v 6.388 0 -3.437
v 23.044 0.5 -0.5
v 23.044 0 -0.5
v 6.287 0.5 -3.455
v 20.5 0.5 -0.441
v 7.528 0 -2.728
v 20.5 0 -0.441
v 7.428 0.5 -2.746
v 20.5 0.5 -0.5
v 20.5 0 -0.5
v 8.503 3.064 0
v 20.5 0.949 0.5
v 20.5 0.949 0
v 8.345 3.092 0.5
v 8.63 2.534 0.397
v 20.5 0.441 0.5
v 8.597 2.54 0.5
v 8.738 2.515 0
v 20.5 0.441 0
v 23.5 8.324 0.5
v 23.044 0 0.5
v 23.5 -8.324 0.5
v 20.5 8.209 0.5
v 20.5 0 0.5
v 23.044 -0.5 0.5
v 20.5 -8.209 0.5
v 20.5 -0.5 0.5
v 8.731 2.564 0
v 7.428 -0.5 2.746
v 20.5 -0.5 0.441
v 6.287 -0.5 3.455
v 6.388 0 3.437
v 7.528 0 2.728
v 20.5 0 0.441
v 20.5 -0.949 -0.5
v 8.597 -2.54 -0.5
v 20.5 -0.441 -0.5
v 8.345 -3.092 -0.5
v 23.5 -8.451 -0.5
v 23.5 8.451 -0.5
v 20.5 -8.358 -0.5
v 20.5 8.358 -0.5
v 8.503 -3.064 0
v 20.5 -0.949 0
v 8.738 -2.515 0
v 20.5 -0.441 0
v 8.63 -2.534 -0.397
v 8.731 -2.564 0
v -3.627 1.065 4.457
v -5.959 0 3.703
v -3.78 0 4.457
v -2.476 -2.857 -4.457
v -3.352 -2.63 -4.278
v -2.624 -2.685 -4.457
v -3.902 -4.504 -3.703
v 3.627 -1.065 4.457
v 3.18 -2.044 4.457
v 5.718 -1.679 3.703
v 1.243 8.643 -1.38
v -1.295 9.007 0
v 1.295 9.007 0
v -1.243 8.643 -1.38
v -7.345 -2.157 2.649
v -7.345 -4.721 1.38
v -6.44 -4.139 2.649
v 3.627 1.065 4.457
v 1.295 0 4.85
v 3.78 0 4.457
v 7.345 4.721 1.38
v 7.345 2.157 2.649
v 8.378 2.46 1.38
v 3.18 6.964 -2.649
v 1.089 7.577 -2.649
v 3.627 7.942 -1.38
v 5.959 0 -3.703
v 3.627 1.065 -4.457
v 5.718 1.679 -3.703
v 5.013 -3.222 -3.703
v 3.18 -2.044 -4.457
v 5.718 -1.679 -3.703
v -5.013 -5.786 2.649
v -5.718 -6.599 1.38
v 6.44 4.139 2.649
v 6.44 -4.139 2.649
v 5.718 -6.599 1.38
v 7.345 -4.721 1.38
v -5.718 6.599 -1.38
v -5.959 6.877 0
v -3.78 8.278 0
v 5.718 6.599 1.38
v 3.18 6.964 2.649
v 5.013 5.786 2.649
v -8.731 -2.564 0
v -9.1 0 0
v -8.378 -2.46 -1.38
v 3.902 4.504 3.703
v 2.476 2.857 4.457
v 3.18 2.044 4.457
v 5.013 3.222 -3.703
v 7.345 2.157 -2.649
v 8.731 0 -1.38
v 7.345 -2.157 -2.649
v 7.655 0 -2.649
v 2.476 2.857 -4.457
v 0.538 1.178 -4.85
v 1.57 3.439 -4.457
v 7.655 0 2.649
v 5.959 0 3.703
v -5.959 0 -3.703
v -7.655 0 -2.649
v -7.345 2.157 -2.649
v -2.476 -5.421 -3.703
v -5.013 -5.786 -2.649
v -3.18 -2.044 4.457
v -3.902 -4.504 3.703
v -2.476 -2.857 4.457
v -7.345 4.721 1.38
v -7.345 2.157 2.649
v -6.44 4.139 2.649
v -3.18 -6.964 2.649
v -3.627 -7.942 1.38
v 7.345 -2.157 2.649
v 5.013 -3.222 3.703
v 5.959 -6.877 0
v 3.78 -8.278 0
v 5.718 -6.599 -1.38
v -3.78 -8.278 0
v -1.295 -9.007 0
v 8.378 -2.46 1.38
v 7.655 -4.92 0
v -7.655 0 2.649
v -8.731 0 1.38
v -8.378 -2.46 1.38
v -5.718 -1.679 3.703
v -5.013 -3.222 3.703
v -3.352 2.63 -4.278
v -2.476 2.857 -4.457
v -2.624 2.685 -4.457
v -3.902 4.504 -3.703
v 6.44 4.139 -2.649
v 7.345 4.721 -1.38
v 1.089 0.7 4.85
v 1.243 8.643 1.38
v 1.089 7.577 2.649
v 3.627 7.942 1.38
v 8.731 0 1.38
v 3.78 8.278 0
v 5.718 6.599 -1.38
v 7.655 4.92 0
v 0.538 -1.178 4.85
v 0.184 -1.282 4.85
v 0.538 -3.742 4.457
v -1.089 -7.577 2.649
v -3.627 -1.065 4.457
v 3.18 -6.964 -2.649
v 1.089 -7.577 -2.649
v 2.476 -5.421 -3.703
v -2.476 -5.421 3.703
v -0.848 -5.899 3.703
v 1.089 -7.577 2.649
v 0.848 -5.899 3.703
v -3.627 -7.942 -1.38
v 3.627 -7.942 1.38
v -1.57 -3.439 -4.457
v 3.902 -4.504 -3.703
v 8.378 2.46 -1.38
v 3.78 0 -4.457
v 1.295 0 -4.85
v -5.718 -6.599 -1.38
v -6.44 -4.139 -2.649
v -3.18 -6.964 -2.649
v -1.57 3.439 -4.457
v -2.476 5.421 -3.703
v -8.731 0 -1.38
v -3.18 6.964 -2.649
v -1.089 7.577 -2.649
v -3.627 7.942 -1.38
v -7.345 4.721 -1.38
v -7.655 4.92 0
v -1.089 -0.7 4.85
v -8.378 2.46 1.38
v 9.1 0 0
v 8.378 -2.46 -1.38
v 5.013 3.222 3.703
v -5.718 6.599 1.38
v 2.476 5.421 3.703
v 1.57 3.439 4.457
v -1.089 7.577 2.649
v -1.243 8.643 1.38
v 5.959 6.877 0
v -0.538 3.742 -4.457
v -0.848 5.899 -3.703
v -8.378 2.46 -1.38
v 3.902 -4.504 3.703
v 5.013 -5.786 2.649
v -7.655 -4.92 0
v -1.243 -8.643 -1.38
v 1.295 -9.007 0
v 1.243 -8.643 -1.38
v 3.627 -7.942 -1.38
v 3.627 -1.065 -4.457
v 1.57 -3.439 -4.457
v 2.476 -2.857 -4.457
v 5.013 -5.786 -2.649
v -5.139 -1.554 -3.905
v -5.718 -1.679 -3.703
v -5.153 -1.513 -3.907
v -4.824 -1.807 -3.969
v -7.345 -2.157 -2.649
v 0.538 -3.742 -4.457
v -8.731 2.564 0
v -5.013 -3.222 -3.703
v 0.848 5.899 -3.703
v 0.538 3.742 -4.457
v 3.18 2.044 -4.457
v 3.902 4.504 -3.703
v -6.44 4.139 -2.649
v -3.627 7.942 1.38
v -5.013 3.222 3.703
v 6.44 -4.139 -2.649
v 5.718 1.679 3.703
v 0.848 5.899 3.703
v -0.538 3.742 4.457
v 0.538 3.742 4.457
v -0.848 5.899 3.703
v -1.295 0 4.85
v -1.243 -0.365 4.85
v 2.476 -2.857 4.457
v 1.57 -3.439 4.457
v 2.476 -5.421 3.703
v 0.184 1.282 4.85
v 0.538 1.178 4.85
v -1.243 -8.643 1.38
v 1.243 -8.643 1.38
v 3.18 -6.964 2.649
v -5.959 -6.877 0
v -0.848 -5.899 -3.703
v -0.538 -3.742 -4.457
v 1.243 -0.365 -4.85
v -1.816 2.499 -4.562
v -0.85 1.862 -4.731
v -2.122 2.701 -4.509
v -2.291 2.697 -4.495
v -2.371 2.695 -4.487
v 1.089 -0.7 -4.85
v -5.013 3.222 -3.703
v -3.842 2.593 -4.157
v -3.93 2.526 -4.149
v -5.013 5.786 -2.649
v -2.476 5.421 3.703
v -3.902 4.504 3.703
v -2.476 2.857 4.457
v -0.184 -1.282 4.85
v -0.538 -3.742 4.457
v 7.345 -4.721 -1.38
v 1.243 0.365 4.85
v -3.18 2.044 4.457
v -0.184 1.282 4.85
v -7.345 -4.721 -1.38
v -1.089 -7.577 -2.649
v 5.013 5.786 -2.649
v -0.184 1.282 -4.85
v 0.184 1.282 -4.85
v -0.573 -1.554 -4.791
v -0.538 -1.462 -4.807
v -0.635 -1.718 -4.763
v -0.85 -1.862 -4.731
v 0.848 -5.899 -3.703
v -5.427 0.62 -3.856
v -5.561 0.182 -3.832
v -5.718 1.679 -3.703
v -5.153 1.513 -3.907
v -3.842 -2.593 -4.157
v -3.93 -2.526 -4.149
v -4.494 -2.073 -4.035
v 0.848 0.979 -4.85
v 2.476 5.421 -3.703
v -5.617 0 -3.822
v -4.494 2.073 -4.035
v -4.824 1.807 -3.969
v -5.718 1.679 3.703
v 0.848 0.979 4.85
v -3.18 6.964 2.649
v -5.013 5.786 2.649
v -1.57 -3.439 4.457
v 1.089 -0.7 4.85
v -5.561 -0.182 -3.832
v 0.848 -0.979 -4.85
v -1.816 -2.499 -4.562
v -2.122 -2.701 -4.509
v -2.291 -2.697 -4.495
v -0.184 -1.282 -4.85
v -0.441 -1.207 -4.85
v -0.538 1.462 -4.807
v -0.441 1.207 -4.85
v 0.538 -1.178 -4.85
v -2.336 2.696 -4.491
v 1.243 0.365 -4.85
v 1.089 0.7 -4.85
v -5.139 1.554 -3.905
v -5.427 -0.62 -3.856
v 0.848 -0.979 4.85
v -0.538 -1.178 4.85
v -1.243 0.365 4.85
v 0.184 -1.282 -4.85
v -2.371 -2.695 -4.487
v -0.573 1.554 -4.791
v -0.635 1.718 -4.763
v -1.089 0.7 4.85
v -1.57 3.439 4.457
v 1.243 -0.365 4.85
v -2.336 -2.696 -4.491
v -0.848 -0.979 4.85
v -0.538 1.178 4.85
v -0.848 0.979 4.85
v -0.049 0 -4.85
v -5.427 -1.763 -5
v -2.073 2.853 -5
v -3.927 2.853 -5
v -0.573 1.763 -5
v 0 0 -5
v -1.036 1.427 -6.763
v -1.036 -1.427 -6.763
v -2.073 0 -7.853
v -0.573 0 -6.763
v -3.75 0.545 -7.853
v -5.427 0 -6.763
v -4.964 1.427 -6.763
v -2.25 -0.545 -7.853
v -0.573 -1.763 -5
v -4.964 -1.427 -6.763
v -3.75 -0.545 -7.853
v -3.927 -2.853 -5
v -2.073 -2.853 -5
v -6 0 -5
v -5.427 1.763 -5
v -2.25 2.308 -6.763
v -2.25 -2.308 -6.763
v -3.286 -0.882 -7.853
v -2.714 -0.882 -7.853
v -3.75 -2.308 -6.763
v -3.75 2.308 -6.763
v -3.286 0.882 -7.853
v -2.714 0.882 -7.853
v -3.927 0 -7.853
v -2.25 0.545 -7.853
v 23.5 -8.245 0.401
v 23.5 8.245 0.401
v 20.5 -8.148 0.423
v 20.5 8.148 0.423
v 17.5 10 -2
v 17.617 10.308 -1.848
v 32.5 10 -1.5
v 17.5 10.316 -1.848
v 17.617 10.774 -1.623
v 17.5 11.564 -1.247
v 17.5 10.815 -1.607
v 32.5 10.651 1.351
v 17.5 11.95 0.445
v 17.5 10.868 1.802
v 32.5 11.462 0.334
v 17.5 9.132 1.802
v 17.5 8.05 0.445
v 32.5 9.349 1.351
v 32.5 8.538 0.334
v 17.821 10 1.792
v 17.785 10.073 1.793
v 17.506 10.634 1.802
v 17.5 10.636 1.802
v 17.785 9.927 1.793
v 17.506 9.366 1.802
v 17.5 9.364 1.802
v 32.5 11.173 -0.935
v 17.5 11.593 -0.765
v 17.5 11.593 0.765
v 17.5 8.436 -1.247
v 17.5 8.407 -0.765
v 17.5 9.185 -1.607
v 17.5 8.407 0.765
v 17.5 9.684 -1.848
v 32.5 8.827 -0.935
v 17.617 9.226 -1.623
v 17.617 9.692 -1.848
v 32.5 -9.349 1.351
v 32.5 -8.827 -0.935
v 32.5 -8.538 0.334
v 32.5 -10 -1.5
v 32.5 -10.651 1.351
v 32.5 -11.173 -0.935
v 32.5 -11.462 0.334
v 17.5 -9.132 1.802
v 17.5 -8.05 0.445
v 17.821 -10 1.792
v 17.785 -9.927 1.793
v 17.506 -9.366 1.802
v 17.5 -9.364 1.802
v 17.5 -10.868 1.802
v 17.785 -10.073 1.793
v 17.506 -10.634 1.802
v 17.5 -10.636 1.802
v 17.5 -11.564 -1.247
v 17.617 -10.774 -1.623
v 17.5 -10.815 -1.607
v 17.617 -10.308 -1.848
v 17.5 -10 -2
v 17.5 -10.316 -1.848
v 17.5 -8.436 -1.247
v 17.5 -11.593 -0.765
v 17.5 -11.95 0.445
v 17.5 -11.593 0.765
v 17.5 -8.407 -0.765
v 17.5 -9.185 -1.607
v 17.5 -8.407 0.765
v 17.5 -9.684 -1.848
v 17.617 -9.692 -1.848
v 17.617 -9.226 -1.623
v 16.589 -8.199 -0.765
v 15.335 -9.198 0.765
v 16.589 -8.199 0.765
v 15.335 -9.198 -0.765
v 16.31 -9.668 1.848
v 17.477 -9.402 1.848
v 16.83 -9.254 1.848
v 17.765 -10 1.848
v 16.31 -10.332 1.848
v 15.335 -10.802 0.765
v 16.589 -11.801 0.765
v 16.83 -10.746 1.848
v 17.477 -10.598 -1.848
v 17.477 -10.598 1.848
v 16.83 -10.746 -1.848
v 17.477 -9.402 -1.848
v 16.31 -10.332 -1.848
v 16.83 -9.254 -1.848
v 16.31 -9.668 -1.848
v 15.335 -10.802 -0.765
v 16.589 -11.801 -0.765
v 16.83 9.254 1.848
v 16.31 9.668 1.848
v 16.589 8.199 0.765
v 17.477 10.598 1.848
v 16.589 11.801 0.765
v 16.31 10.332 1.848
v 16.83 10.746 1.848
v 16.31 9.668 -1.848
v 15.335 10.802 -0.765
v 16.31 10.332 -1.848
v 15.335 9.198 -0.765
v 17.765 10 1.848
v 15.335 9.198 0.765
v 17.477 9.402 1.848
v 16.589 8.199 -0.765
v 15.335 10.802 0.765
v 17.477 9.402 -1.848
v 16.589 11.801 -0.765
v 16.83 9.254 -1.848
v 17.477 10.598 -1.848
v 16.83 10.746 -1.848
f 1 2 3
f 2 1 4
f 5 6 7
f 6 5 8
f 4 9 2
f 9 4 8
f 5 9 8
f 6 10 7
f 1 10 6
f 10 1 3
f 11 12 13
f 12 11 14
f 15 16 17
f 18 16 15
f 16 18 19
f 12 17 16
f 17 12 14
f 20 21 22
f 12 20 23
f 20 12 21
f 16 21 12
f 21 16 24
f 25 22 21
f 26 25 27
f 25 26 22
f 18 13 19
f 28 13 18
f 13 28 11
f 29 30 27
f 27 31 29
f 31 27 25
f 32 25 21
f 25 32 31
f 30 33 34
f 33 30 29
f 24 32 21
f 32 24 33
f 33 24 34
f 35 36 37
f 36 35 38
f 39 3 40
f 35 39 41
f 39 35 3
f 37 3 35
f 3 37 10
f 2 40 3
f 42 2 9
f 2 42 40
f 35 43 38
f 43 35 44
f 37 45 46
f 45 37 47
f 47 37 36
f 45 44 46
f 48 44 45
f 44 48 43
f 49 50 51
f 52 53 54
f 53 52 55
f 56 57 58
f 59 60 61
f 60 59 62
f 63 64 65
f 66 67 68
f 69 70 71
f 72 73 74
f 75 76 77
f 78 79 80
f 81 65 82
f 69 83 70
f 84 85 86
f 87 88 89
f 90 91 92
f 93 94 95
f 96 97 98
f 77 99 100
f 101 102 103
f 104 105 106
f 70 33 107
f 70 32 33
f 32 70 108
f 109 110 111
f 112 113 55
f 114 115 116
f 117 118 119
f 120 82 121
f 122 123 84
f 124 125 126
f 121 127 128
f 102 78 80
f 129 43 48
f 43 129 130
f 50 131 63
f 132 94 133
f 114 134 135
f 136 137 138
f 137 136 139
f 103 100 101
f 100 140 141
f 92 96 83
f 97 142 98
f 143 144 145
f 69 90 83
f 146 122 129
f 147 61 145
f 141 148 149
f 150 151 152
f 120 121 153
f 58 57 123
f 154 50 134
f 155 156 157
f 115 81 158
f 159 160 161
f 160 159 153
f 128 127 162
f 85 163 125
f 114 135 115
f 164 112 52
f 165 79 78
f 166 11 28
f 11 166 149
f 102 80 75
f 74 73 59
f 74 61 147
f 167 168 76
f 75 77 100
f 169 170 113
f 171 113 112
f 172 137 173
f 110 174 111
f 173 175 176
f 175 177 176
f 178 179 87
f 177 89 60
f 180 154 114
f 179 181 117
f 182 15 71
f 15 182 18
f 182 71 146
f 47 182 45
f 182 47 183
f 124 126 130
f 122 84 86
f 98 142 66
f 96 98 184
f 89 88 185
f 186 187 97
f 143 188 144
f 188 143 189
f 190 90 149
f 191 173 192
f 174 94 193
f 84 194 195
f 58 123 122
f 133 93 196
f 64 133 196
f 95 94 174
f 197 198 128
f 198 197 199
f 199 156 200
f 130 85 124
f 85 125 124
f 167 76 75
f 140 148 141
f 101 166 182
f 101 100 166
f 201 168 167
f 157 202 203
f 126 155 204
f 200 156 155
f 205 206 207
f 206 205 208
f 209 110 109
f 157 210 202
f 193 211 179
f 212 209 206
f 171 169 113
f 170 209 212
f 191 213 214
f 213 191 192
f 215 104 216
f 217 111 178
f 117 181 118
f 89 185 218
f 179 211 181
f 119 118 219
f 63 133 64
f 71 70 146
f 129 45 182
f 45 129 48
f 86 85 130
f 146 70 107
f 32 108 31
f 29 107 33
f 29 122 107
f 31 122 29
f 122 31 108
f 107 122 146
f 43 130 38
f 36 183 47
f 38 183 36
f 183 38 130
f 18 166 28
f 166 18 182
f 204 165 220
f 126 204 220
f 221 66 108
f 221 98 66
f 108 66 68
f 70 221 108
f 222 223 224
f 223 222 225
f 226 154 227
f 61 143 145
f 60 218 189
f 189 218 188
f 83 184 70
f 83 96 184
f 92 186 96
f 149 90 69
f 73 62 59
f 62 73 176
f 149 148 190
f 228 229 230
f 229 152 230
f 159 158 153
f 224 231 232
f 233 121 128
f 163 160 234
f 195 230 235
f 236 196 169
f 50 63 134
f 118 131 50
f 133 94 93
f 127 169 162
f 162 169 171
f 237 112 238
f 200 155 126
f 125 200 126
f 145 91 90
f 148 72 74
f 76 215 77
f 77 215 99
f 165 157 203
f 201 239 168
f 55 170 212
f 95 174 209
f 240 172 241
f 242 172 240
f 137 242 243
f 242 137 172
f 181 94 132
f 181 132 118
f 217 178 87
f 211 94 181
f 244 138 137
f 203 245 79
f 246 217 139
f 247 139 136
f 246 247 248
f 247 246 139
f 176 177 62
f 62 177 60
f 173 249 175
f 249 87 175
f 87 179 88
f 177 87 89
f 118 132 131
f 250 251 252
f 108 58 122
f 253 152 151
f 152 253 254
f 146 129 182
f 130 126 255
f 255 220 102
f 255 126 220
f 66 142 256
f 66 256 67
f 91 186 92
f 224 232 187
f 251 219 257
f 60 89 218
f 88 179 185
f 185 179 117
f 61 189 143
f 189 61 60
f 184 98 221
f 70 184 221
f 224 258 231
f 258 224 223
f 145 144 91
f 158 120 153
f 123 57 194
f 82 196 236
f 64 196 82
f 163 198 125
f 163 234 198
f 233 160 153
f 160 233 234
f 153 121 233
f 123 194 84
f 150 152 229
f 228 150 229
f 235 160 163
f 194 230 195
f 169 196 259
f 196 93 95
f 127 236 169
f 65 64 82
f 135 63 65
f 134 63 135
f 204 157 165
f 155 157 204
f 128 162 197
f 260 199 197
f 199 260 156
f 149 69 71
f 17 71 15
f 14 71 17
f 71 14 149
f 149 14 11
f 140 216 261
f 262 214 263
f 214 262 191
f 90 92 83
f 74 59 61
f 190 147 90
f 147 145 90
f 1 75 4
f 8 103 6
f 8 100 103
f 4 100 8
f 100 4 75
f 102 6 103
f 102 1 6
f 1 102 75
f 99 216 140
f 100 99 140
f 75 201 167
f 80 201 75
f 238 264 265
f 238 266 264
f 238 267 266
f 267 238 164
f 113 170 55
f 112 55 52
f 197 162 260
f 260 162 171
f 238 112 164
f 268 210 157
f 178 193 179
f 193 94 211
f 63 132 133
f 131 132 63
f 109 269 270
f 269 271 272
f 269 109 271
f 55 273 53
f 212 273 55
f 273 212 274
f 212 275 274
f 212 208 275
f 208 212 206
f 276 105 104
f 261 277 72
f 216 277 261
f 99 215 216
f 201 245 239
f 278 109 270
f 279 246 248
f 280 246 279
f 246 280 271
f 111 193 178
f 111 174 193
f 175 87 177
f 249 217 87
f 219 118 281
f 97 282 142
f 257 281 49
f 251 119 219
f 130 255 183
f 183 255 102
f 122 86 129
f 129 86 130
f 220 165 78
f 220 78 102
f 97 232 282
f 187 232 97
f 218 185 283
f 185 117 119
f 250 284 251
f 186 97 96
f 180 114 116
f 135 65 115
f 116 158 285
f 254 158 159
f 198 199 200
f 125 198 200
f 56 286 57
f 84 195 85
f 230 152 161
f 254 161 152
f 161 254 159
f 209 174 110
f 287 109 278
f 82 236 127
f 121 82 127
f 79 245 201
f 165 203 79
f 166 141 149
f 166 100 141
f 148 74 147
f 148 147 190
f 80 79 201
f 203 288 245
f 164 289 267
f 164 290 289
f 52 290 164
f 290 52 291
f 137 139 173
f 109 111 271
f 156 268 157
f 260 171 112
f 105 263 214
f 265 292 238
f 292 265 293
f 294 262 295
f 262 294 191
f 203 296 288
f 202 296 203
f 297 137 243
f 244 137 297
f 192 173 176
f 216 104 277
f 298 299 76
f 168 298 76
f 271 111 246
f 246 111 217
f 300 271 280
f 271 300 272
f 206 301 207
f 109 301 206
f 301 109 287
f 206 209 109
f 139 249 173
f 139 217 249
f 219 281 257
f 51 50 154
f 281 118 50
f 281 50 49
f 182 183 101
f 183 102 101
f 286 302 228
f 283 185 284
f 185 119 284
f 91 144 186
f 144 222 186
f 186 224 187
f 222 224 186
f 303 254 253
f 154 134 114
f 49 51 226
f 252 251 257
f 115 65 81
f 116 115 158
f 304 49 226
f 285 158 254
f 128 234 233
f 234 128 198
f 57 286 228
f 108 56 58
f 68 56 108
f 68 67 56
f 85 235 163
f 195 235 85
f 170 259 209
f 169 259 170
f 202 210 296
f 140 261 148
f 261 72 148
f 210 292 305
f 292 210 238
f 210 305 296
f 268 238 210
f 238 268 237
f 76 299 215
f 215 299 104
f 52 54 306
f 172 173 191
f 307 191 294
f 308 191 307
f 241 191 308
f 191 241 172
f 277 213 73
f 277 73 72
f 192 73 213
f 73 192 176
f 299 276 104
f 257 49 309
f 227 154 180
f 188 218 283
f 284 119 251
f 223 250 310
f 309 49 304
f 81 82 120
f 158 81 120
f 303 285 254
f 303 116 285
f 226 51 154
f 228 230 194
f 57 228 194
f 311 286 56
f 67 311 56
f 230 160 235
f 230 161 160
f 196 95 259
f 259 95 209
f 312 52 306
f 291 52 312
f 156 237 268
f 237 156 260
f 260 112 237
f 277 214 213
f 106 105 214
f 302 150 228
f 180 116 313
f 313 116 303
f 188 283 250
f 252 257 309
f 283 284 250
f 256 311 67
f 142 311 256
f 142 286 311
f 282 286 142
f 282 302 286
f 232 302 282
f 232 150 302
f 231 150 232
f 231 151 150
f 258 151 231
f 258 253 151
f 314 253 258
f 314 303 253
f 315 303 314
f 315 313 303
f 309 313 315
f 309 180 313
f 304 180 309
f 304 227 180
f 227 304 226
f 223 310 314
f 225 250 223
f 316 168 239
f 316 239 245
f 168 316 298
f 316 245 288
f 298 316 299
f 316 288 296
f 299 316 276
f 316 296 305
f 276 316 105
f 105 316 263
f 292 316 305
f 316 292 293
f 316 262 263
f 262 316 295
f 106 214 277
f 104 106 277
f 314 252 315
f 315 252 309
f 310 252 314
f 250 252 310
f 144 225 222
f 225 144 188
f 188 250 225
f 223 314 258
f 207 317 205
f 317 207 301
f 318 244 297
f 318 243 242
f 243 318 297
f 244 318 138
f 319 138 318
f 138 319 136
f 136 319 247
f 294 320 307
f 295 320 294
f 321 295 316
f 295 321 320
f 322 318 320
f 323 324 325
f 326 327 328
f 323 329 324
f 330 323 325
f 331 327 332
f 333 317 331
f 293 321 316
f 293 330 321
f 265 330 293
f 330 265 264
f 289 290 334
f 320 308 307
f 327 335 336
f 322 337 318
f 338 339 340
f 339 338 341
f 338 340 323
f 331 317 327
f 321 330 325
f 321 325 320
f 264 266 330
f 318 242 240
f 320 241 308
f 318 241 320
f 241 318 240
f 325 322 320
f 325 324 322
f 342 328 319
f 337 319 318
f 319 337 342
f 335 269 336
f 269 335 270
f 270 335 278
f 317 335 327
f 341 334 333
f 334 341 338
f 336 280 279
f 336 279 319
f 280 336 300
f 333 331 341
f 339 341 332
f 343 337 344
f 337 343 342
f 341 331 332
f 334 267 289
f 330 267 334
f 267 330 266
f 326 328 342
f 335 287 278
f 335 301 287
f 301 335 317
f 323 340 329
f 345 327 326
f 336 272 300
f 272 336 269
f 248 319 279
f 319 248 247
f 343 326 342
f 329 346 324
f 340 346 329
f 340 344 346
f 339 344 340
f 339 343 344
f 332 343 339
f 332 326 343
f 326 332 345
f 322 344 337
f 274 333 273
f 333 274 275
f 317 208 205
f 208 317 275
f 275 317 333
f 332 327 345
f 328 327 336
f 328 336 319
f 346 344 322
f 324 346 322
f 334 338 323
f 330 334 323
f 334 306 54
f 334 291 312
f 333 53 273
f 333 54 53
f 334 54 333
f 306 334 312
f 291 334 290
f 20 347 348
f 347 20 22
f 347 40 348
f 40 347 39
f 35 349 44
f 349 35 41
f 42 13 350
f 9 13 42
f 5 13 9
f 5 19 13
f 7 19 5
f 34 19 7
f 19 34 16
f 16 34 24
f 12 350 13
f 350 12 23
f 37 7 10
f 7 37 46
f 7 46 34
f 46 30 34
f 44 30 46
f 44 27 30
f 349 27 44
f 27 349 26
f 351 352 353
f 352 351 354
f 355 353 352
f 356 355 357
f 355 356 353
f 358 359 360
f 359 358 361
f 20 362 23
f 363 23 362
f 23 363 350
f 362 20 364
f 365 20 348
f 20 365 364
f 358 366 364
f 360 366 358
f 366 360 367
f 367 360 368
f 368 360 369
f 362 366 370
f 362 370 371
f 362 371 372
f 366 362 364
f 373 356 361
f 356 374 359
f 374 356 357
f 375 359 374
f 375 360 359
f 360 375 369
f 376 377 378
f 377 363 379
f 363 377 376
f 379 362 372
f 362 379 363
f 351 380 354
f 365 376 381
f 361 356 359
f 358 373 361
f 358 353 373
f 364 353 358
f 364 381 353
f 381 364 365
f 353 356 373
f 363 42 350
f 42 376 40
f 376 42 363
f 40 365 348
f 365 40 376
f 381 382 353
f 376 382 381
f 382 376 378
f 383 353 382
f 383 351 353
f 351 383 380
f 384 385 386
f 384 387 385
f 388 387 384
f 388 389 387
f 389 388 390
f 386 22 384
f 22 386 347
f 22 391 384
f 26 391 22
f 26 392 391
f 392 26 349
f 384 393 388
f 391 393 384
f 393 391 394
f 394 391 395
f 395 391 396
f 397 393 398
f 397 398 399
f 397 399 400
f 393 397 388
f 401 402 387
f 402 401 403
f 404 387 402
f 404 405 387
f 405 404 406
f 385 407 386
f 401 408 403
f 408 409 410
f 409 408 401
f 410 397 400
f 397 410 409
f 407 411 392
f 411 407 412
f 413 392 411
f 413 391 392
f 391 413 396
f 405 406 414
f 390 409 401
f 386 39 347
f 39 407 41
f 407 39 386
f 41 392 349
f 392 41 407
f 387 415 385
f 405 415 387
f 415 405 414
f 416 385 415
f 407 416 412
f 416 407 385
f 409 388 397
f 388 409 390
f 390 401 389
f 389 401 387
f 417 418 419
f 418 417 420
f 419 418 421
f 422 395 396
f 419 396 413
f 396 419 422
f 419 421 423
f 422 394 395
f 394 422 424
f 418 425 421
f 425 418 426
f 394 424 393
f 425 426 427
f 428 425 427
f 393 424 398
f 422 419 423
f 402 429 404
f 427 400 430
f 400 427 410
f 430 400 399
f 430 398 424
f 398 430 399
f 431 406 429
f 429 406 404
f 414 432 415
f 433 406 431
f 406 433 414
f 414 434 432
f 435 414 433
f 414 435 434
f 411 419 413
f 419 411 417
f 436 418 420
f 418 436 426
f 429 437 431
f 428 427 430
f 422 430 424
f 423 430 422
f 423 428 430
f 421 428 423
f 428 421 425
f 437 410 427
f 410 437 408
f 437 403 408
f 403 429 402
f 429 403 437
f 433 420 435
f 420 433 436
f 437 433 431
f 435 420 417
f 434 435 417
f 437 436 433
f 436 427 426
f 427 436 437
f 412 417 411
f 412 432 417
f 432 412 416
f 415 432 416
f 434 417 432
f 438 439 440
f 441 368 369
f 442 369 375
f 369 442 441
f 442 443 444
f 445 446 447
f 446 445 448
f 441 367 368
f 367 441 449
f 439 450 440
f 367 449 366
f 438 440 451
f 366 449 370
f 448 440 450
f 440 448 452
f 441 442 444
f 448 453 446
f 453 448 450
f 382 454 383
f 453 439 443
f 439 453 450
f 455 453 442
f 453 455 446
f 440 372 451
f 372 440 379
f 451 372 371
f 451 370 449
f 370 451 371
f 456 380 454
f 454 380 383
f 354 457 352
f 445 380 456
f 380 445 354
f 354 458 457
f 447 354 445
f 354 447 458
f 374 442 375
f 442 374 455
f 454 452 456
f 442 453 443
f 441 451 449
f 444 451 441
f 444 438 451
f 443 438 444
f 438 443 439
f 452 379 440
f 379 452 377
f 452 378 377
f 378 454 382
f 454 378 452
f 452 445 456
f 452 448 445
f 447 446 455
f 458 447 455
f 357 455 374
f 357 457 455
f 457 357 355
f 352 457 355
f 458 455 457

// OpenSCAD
module trussrod()
{
		rotate(a = 80, v = [0, 1, 0])
			cube(size = [20, 0.5, 0.5], center = false);
}

module truss()
{
	union() {
		trussrod();
		rotate(a = 90, v = [0, 0, 1])
			trussrod();
		rotate(a = 180, v = [0, 0, 1])
			trussrod();
		rotate(a = -90, v = [0, 0, 1])
			trussrod();
	}
}

module main_fuselage()
{
	union() {
		rotate(a = 90, v = [0, 1, 0])
			translate(v = [0, 0, 23])
				truss();
		scale(v = [1.3, 1.3, 0.7])
			sphere(r = 7);
		translate(v = [-3, 0, -5])
			sphere(r = 3);
		translate(v = [22, 0, 0])
			cube(size = [3, 17, 1], center = true);
		translate(v = [25, 10, 0])
			rotate(a = 90, v = [0, 1, 0])
				cylinder(h = 15, r1 = 2, r2 = 1.5, center = true);
		translate(v = [25, -10, 0]) 
			rotate(a = 90, v = [0, 1, 0])
				cylinder(h = 15, r1 = 2, r2 = 1.5, center = true);
		translate(v = [17, -10, 0])
			sphere(r = 2);
		translate(v = [17, 10, 0])
			sphere(r = 2);
	}
}



main_fuselage();
